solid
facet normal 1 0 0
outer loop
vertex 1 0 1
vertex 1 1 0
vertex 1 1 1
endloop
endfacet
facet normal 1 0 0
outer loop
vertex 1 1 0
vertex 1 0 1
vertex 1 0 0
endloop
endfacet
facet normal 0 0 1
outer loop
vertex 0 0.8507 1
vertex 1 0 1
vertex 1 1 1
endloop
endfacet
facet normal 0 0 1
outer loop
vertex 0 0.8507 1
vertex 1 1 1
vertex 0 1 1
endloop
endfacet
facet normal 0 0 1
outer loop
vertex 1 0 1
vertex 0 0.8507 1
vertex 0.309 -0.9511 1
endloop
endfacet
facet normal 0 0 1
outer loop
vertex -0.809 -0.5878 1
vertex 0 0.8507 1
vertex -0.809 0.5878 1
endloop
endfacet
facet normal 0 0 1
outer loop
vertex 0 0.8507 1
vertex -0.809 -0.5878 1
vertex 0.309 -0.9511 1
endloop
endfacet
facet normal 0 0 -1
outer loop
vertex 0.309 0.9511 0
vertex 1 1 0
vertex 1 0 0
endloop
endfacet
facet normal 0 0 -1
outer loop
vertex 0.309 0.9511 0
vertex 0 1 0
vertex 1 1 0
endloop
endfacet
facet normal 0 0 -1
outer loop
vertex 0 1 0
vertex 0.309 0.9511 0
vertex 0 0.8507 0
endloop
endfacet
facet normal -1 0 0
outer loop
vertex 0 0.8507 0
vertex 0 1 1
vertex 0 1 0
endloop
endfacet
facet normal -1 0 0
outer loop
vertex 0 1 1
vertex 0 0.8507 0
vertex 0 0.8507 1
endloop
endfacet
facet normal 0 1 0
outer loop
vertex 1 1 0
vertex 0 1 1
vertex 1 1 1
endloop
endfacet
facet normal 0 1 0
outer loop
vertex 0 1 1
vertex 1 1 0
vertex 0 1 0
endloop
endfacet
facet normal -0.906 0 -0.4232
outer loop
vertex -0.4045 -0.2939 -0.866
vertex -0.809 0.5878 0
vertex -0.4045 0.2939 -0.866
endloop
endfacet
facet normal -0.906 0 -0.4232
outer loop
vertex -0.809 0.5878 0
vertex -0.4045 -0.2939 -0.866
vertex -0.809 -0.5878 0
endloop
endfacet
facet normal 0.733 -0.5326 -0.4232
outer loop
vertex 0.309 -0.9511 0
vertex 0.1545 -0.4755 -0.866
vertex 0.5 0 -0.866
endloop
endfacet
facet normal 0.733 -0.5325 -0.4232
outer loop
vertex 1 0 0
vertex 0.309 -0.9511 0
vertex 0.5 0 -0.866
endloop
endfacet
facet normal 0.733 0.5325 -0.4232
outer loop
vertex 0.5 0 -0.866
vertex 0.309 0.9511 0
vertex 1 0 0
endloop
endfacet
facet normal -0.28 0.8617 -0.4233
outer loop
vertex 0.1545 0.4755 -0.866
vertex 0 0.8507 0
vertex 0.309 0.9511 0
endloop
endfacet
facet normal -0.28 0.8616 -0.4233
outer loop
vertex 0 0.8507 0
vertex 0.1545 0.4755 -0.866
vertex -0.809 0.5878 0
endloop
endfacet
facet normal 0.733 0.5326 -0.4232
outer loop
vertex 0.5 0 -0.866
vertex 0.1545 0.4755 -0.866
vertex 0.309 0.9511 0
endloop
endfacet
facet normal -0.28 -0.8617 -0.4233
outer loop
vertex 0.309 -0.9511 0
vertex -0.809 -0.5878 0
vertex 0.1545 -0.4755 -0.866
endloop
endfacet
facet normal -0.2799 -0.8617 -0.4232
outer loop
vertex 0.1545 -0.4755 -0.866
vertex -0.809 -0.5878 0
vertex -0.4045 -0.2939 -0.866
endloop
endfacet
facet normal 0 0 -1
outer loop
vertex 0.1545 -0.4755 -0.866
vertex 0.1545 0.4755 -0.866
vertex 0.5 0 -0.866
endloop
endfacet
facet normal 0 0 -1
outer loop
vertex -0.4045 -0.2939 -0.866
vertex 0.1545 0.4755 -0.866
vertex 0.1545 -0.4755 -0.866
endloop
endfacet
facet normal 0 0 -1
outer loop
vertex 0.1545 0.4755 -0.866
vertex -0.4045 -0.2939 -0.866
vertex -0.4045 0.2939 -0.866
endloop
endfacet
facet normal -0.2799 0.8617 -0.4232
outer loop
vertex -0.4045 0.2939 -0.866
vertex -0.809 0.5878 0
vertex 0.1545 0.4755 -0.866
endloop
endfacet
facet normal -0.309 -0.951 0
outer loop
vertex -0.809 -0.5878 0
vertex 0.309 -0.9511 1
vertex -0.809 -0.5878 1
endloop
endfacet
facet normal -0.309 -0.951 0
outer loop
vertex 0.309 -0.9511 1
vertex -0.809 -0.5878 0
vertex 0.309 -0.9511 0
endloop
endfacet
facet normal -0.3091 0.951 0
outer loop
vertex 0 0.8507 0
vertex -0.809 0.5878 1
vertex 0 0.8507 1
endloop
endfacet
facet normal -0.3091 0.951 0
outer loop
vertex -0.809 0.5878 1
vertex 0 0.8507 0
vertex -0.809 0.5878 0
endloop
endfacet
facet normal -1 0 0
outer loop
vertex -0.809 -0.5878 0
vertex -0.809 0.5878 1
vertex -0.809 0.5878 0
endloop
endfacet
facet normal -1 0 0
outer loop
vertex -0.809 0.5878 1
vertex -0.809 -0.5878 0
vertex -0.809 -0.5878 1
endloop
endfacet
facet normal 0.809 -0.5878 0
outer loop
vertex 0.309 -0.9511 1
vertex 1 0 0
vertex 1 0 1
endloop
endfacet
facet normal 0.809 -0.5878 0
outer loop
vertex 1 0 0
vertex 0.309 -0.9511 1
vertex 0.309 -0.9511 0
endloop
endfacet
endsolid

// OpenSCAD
module LazyChildrenTest() {
  color("Red") children();
}

LazyChildrenTest() {
    cube();
    sphere();
    cylinder();
}
